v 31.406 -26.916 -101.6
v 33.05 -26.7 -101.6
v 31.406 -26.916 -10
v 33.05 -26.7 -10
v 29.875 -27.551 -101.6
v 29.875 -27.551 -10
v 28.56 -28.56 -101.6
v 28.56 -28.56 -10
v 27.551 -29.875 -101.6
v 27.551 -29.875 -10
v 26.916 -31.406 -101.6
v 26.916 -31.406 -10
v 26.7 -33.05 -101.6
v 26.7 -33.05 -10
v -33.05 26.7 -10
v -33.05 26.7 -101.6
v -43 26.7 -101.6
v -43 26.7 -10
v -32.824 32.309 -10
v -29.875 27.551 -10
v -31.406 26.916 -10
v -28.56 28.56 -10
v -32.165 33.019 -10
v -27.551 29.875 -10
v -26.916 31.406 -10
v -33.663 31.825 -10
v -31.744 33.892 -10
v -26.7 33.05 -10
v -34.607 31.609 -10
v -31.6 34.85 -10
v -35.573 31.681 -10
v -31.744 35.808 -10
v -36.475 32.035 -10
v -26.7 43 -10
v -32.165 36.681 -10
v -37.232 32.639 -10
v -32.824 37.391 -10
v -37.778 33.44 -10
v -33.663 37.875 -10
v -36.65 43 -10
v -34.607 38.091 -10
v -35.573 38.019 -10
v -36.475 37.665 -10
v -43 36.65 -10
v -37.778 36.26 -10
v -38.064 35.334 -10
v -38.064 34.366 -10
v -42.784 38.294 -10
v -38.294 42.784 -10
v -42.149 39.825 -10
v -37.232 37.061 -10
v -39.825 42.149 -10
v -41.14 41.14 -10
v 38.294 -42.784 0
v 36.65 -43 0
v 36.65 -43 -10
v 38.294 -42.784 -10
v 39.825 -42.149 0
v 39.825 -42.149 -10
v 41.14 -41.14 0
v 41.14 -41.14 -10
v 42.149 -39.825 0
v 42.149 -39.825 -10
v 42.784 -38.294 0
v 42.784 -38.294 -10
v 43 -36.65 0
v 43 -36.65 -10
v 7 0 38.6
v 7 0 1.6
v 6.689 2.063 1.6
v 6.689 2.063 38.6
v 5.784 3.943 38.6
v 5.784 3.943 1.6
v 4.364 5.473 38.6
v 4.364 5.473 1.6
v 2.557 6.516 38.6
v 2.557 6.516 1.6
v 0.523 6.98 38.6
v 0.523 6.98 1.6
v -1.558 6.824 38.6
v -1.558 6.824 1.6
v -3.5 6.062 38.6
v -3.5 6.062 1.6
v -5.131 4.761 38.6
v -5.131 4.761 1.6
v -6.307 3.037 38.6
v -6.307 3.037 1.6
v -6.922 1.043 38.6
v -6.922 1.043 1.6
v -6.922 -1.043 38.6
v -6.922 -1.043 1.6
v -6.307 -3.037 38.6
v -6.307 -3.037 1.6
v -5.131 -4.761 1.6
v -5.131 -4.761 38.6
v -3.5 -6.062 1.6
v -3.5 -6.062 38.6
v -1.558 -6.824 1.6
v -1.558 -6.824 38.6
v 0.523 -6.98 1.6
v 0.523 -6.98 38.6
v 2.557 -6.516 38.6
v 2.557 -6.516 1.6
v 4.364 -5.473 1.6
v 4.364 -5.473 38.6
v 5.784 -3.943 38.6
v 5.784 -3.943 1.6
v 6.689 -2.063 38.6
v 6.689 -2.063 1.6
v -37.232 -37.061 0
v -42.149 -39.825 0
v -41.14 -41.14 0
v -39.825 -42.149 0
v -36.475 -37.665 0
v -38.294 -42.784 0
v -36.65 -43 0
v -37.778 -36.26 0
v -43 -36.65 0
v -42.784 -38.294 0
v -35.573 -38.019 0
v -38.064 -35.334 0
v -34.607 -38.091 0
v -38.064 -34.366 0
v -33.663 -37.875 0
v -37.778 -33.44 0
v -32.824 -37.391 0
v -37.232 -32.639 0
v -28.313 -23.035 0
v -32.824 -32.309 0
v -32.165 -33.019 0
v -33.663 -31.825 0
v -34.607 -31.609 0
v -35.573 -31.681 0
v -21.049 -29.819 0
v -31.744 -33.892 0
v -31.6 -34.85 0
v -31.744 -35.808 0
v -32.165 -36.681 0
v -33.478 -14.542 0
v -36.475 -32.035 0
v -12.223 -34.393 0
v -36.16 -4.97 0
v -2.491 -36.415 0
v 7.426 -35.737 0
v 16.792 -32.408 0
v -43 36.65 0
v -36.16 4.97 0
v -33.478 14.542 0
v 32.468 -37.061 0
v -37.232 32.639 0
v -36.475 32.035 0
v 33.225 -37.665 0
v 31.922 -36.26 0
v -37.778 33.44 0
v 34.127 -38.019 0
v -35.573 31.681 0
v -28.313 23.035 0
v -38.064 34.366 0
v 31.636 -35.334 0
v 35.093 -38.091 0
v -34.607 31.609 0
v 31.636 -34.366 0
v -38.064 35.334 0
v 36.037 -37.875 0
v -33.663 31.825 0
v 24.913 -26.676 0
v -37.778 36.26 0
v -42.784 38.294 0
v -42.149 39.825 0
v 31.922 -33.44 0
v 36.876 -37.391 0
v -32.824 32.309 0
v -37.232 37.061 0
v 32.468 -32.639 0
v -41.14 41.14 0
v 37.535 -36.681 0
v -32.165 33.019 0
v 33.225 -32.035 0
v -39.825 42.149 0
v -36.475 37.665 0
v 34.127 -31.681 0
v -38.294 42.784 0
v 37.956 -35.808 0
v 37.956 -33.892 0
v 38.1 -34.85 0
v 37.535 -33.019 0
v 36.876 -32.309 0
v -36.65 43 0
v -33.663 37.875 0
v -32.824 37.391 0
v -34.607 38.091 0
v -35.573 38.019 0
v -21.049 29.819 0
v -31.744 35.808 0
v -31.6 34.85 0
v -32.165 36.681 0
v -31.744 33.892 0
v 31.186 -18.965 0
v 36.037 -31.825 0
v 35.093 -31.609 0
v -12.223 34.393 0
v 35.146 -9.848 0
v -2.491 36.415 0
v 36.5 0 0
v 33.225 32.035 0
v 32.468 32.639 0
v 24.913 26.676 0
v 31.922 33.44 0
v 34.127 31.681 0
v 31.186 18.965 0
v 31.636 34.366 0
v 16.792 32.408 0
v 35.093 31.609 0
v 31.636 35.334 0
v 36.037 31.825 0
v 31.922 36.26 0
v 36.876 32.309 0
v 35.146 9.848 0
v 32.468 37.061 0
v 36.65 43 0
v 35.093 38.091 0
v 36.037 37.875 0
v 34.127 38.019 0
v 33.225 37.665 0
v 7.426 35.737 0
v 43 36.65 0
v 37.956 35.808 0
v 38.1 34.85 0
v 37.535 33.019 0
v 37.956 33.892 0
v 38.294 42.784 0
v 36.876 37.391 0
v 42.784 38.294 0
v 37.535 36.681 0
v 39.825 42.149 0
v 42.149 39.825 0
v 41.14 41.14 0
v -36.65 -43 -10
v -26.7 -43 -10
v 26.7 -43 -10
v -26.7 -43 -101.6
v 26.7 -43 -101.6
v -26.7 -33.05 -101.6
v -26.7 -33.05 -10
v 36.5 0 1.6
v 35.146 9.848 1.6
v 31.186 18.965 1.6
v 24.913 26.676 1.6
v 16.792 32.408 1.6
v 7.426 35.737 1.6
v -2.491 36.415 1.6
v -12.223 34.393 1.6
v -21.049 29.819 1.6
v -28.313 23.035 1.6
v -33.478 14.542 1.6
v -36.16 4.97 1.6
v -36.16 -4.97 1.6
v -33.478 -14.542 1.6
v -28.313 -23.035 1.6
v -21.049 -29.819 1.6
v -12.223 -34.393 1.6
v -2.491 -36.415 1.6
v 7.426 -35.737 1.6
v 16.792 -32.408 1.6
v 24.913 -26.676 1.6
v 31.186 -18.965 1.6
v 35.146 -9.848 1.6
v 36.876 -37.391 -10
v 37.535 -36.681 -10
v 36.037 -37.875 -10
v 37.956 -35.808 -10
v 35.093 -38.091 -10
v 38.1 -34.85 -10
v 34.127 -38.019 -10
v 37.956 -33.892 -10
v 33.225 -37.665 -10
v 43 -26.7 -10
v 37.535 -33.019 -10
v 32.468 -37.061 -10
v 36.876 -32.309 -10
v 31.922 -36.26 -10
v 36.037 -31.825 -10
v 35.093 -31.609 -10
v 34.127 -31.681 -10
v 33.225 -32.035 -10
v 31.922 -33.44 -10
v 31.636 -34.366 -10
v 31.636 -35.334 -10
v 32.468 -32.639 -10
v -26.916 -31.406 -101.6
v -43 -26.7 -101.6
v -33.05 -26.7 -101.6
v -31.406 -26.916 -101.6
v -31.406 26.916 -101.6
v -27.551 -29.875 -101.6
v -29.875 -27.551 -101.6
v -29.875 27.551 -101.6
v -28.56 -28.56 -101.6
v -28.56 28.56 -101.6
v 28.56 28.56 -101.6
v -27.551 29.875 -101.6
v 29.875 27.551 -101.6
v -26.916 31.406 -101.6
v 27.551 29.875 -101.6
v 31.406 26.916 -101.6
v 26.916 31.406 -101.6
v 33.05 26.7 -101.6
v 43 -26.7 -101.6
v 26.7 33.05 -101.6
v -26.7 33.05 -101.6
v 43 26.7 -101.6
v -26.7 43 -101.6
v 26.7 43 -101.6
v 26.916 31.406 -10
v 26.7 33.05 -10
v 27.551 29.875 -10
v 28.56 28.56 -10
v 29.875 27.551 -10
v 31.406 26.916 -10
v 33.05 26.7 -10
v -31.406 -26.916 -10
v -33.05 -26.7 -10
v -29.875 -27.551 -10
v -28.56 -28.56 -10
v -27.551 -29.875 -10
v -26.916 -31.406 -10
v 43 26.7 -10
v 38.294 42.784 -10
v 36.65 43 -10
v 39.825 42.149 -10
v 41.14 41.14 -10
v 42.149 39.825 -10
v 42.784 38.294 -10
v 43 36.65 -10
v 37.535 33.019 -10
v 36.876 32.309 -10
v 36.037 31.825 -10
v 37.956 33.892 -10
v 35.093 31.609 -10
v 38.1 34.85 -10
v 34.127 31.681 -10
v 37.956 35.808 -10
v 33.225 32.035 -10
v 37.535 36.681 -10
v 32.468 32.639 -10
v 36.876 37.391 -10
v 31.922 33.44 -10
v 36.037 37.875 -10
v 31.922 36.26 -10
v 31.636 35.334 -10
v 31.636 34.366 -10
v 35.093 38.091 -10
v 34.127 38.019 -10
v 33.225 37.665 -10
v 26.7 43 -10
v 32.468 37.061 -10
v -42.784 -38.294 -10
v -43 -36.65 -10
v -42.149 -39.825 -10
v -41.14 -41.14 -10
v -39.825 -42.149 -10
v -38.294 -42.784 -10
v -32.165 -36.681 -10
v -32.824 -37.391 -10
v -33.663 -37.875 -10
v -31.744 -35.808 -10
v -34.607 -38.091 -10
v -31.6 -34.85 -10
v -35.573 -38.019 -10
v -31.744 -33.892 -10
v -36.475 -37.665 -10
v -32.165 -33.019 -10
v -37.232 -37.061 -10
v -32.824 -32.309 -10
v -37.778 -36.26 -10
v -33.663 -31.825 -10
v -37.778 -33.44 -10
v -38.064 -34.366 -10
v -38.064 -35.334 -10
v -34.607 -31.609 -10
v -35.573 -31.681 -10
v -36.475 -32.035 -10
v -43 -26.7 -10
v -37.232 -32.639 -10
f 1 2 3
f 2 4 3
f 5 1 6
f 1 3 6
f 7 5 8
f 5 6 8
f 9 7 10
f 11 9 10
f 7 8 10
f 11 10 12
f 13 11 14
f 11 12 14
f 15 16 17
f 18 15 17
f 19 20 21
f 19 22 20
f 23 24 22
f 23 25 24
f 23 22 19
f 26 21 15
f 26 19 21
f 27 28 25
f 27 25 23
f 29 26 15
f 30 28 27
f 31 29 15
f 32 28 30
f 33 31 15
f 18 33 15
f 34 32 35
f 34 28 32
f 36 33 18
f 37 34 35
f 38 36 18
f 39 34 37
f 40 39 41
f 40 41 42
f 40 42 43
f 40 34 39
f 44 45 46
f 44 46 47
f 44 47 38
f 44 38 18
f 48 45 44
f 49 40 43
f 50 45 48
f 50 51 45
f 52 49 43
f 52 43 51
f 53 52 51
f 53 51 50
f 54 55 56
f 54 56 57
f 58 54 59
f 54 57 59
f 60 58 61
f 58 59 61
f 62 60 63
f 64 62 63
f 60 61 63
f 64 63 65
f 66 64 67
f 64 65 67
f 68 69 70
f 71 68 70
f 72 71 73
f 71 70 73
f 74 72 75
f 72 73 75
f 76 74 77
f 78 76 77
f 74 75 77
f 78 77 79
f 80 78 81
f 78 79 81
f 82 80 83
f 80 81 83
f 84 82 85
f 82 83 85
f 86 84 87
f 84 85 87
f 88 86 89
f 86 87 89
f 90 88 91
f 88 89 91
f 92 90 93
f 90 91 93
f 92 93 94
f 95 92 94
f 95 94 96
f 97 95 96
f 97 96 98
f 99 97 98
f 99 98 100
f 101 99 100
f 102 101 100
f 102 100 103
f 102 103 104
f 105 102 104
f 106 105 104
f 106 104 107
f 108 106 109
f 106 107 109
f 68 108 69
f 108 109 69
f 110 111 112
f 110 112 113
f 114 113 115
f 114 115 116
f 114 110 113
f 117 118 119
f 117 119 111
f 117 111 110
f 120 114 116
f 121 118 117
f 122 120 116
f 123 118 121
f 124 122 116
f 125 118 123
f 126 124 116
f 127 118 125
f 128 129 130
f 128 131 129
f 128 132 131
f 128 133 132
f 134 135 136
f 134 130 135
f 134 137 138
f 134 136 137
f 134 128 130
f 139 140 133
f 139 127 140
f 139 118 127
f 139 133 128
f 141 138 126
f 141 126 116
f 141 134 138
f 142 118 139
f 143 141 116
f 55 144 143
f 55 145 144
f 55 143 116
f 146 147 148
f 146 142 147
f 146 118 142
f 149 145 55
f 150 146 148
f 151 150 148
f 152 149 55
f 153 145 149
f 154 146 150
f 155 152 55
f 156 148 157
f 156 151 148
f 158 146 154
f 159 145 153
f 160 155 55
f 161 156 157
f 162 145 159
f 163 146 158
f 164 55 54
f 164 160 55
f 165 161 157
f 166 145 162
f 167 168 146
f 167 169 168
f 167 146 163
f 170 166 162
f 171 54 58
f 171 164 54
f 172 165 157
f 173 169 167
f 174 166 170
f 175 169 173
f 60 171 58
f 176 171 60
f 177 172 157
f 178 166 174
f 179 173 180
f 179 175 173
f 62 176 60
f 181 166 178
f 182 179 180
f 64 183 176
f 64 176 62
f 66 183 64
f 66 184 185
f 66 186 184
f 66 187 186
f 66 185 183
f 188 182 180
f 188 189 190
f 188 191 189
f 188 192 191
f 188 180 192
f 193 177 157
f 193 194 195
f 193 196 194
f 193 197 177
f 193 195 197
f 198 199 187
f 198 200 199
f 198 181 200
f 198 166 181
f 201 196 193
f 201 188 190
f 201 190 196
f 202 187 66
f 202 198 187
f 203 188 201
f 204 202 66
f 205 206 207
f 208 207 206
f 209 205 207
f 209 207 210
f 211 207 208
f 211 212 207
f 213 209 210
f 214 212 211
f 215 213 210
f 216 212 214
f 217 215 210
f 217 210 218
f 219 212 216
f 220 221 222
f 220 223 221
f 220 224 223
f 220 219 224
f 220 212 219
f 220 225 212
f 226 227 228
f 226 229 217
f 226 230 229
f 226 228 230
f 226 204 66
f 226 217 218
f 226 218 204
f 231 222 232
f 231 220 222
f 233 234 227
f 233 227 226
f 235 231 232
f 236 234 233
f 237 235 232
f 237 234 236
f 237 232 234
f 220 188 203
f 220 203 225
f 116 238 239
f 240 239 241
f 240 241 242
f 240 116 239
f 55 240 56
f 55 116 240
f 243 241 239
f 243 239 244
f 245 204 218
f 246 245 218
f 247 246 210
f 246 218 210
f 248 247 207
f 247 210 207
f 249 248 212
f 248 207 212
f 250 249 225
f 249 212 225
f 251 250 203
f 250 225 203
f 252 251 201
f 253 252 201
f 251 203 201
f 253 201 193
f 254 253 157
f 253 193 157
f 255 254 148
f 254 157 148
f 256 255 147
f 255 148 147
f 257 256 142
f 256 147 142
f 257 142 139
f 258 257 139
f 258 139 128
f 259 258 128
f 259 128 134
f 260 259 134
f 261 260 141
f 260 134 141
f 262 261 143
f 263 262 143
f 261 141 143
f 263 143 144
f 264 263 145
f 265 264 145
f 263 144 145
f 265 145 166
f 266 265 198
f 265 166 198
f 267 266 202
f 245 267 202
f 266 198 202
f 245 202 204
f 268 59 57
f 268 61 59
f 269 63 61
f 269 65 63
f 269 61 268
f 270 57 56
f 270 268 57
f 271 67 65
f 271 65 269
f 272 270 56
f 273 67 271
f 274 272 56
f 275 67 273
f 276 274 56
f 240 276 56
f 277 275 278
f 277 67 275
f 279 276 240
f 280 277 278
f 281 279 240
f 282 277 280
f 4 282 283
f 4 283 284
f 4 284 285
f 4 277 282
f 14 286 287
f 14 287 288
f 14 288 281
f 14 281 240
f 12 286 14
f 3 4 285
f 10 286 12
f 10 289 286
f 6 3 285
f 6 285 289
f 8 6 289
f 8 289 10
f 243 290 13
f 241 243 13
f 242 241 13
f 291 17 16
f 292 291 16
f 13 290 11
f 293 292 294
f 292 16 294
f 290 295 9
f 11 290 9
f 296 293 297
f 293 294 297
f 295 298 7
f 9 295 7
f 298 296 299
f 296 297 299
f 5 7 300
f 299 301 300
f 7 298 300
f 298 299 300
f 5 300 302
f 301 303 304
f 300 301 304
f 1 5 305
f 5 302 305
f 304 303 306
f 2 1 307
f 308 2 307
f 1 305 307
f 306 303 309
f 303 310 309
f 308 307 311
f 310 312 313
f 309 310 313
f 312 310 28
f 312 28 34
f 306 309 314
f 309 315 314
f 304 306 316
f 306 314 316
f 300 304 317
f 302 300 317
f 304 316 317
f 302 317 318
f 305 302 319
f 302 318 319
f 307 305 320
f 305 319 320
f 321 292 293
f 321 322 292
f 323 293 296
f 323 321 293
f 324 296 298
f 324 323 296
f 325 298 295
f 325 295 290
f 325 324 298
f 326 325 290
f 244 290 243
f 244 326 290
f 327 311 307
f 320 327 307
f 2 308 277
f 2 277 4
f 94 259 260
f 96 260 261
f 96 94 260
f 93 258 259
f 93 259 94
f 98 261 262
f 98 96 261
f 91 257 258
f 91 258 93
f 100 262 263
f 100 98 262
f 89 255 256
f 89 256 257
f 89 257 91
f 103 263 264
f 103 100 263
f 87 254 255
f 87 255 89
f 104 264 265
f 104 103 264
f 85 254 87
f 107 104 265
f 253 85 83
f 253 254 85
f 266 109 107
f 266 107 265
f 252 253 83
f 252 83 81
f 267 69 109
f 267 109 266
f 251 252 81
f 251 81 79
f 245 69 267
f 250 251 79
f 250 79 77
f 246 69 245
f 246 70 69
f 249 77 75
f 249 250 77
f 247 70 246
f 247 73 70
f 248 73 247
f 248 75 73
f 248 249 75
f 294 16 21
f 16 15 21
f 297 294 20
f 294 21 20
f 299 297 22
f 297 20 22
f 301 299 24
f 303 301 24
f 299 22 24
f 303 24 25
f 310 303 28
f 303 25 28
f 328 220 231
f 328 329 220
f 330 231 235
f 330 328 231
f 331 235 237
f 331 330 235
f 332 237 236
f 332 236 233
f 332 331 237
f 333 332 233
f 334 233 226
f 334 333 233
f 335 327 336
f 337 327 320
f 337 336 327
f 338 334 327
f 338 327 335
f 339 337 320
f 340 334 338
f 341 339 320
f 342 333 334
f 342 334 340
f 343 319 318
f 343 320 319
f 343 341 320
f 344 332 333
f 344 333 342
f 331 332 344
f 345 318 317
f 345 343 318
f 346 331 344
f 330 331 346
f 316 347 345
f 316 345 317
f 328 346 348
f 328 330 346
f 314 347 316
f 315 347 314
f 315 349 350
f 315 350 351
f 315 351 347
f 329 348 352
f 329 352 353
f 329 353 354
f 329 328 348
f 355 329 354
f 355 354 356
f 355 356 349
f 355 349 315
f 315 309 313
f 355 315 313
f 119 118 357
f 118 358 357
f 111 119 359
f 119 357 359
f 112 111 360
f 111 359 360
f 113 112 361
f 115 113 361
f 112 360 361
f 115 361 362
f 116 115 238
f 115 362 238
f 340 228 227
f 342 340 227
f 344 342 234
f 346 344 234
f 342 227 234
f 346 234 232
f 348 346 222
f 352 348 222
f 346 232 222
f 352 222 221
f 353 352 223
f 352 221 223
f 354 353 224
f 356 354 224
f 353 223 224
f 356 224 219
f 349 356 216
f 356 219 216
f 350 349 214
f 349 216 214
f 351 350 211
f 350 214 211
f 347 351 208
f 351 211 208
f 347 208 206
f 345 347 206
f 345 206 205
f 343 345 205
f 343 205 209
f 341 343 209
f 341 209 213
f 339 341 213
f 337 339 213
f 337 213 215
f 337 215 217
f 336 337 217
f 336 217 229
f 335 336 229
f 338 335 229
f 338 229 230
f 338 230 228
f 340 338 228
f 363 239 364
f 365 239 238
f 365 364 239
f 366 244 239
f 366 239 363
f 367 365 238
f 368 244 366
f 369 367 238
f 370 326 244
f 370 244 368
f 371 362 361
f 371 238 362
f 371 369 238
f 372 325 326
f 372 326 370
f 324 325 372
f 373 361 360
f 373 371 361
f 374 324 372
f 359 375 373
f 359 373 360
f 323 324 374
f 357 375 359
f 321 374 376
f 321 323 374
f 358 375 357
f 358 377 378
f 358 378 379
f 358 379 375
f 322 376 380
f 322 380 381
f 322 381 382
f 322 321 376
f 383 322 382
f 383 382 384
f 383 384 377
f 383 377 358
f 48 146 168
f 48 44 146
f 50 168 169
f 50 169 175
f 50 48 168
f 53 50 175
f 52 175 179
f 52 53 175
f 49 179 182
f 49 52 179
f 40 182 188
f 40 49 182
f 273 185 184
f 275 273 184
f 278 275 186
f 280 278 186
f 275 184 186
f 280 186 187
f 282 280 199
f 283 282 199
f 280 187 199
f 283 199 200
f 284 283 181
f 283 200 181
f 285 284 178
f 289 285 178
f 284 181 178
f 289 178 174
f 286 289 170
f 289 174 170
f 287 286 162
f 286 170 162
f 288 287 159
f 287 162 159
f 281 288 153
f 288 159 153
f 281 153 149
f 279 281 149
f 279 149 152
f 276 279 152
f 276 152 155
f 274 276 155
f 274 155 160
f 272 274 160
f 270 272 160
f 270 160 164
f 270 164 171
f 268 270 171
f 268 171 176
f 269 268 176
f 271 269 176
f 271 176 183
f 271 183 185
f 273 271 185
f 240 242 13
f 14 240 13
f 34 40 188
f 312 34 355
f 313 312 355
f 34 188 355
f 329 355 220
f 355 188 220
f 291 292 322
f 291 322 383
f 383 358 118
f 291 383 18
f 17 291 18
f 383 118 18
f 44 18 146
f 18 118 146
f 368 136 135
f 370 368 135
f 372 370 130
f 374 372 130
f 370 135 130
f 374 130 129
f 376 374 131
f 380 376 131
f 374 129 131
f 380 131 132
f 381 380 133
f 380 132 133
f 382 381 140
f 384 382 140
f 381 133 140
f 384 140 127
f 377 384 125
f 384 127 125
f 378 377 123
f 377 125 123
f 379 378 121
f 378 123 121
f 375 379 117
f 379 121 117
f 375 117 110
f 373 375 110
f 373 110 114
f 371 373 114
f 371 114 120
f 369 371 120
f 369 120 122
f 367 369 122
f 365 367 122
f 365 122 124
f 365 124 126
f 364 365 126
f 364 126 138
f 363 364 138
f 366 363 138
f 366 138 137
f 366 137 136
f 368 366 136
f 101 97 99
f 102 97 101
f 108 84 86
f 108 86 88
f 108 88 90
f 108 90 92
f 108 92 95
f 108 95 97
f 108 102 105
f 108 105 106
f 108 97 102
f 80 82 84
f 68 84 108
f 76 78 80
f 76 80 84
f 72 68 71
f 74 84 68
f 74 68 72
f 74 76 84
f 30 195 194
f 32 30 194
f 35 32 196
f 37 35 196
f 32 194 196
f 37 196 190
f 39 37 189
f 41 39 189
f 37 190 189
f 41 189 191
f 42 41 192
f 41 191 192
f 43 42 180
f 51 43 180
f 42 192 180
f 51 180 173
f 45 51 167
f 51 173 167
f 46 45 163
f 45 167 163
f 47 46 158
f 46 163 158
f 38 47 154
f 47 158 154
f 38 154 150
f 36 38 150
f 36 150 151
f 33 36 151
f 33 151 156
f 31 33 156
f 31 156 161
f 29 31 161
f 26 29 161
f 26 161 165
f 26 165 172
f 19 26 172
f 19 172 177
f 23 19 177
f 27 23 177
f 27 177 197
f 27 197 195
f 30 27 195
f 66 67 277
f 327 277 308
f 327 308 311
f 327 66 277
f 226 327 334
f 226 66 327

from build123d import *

# Parameters (mm, degrees)
SKETCH1_W           = 86
SKETCH1_H           = 86
BOSS_EXTRUDE1_DEPTH = 101.6
SKETCH2_R           = 36.5
BOSS_EXTRUDE2_DEPTH = 1.6
SKETCH3_R           = 7
BOSS_EXTRUDE3_DEPTH = 37
SKETCH5_R           = 3.25
CUT_EXTRUDE1_DEPTH  = 102.6
SKETCH4_W           = 16.3
SKETCH4_H           = 16.3
CUT_EXTRUDE2_DEPTH  = 91.6
FILLET1_R           = 6.35


with BuildPart() as part:
    # Sketch1 → Boss-Extrude1 (new body)
    with BuildSketch(Plane.XY):
        Rectangle(SKETCH1_W, SKETCH1_H)
    extrude(amount=-BOSS_EXTRUDE1_DEPTH)

    # Sketch2 → Boss-Extrude2 (add)
    with BuildSketch(Plane.XY):
        Circle(SKETCH2_R)
    extrude(amount=BOSS_EXTRUDE2_DEPTH)

    # Sketch3 → Boss-Extrude3 (add)
    with BuildSketch(Plane.XY.offset(1.6)):
        Circle(SKETCH3_R)
    extrude(amount=BOSS_EXTRUDE3_DEPTH)

    # Sketch5 → Cut-Extrude1 (cut, through all)
    with BuildSketch(Plane.XY):
        with Locations((-34.85, 34.85)):
            Circle(SKETCH5_R)
        with Locations((34.85, 34.85)):
            Circle(SKETCH5_R)
        with Locations((34.85, -34.85)):
            Circle(SKETCH5_R)
        with Locations((-34.85, -34.85)):
            Circle(SKETCH5_R)
    extrude(amount=-CUT_EXTRUDE1_DEPTH, mode=Mode.SUBTRACT)

    # Sketch4 → Cut-Extrude2 (cut)
    with BuildSketch(Plane(origin=(0, 0, -101.6), x_dir=(-1, 0, 0), z_dir=(0, 0, -1))):
        with Locations((-34.85, 34.85)):
            Rectangle(SKETCH4_W, SKETCH4_H)
        with Locations((-34.85, -34.85)):
            Rectangle(SKETCH4_W, SKETCH4_H)
        with Locations((34.85, -34.85)):
            Rectangle(SKETCH4_W, SKETCH4_H)
        with Locations((34.85, 34.85)):
            Rectangle(SKETCH4_W, SKETCH4_H)
    extrude(amount=-CUT_EXTRUDE2_DEPTH, mode=Mode.SUBTRACT)

    # Fillet1
    fillet1_edges = [part.edges().sort_by_distance(p)[0] for p in [
        (43, 43, -5),
        (-43, 43, -5),
        (-43, -43, -5),
        (43, -43, -5),
        (-26.7, 26.7, -55.8),
        (-26.7, -26.7, -55.8),
        (26.7, -26.7, -55.8),
        (26.7, 26.7, -55.8),
    ]]
    fillet(fillet1_edges, radius=FILLET1_R)


solid = part.part
